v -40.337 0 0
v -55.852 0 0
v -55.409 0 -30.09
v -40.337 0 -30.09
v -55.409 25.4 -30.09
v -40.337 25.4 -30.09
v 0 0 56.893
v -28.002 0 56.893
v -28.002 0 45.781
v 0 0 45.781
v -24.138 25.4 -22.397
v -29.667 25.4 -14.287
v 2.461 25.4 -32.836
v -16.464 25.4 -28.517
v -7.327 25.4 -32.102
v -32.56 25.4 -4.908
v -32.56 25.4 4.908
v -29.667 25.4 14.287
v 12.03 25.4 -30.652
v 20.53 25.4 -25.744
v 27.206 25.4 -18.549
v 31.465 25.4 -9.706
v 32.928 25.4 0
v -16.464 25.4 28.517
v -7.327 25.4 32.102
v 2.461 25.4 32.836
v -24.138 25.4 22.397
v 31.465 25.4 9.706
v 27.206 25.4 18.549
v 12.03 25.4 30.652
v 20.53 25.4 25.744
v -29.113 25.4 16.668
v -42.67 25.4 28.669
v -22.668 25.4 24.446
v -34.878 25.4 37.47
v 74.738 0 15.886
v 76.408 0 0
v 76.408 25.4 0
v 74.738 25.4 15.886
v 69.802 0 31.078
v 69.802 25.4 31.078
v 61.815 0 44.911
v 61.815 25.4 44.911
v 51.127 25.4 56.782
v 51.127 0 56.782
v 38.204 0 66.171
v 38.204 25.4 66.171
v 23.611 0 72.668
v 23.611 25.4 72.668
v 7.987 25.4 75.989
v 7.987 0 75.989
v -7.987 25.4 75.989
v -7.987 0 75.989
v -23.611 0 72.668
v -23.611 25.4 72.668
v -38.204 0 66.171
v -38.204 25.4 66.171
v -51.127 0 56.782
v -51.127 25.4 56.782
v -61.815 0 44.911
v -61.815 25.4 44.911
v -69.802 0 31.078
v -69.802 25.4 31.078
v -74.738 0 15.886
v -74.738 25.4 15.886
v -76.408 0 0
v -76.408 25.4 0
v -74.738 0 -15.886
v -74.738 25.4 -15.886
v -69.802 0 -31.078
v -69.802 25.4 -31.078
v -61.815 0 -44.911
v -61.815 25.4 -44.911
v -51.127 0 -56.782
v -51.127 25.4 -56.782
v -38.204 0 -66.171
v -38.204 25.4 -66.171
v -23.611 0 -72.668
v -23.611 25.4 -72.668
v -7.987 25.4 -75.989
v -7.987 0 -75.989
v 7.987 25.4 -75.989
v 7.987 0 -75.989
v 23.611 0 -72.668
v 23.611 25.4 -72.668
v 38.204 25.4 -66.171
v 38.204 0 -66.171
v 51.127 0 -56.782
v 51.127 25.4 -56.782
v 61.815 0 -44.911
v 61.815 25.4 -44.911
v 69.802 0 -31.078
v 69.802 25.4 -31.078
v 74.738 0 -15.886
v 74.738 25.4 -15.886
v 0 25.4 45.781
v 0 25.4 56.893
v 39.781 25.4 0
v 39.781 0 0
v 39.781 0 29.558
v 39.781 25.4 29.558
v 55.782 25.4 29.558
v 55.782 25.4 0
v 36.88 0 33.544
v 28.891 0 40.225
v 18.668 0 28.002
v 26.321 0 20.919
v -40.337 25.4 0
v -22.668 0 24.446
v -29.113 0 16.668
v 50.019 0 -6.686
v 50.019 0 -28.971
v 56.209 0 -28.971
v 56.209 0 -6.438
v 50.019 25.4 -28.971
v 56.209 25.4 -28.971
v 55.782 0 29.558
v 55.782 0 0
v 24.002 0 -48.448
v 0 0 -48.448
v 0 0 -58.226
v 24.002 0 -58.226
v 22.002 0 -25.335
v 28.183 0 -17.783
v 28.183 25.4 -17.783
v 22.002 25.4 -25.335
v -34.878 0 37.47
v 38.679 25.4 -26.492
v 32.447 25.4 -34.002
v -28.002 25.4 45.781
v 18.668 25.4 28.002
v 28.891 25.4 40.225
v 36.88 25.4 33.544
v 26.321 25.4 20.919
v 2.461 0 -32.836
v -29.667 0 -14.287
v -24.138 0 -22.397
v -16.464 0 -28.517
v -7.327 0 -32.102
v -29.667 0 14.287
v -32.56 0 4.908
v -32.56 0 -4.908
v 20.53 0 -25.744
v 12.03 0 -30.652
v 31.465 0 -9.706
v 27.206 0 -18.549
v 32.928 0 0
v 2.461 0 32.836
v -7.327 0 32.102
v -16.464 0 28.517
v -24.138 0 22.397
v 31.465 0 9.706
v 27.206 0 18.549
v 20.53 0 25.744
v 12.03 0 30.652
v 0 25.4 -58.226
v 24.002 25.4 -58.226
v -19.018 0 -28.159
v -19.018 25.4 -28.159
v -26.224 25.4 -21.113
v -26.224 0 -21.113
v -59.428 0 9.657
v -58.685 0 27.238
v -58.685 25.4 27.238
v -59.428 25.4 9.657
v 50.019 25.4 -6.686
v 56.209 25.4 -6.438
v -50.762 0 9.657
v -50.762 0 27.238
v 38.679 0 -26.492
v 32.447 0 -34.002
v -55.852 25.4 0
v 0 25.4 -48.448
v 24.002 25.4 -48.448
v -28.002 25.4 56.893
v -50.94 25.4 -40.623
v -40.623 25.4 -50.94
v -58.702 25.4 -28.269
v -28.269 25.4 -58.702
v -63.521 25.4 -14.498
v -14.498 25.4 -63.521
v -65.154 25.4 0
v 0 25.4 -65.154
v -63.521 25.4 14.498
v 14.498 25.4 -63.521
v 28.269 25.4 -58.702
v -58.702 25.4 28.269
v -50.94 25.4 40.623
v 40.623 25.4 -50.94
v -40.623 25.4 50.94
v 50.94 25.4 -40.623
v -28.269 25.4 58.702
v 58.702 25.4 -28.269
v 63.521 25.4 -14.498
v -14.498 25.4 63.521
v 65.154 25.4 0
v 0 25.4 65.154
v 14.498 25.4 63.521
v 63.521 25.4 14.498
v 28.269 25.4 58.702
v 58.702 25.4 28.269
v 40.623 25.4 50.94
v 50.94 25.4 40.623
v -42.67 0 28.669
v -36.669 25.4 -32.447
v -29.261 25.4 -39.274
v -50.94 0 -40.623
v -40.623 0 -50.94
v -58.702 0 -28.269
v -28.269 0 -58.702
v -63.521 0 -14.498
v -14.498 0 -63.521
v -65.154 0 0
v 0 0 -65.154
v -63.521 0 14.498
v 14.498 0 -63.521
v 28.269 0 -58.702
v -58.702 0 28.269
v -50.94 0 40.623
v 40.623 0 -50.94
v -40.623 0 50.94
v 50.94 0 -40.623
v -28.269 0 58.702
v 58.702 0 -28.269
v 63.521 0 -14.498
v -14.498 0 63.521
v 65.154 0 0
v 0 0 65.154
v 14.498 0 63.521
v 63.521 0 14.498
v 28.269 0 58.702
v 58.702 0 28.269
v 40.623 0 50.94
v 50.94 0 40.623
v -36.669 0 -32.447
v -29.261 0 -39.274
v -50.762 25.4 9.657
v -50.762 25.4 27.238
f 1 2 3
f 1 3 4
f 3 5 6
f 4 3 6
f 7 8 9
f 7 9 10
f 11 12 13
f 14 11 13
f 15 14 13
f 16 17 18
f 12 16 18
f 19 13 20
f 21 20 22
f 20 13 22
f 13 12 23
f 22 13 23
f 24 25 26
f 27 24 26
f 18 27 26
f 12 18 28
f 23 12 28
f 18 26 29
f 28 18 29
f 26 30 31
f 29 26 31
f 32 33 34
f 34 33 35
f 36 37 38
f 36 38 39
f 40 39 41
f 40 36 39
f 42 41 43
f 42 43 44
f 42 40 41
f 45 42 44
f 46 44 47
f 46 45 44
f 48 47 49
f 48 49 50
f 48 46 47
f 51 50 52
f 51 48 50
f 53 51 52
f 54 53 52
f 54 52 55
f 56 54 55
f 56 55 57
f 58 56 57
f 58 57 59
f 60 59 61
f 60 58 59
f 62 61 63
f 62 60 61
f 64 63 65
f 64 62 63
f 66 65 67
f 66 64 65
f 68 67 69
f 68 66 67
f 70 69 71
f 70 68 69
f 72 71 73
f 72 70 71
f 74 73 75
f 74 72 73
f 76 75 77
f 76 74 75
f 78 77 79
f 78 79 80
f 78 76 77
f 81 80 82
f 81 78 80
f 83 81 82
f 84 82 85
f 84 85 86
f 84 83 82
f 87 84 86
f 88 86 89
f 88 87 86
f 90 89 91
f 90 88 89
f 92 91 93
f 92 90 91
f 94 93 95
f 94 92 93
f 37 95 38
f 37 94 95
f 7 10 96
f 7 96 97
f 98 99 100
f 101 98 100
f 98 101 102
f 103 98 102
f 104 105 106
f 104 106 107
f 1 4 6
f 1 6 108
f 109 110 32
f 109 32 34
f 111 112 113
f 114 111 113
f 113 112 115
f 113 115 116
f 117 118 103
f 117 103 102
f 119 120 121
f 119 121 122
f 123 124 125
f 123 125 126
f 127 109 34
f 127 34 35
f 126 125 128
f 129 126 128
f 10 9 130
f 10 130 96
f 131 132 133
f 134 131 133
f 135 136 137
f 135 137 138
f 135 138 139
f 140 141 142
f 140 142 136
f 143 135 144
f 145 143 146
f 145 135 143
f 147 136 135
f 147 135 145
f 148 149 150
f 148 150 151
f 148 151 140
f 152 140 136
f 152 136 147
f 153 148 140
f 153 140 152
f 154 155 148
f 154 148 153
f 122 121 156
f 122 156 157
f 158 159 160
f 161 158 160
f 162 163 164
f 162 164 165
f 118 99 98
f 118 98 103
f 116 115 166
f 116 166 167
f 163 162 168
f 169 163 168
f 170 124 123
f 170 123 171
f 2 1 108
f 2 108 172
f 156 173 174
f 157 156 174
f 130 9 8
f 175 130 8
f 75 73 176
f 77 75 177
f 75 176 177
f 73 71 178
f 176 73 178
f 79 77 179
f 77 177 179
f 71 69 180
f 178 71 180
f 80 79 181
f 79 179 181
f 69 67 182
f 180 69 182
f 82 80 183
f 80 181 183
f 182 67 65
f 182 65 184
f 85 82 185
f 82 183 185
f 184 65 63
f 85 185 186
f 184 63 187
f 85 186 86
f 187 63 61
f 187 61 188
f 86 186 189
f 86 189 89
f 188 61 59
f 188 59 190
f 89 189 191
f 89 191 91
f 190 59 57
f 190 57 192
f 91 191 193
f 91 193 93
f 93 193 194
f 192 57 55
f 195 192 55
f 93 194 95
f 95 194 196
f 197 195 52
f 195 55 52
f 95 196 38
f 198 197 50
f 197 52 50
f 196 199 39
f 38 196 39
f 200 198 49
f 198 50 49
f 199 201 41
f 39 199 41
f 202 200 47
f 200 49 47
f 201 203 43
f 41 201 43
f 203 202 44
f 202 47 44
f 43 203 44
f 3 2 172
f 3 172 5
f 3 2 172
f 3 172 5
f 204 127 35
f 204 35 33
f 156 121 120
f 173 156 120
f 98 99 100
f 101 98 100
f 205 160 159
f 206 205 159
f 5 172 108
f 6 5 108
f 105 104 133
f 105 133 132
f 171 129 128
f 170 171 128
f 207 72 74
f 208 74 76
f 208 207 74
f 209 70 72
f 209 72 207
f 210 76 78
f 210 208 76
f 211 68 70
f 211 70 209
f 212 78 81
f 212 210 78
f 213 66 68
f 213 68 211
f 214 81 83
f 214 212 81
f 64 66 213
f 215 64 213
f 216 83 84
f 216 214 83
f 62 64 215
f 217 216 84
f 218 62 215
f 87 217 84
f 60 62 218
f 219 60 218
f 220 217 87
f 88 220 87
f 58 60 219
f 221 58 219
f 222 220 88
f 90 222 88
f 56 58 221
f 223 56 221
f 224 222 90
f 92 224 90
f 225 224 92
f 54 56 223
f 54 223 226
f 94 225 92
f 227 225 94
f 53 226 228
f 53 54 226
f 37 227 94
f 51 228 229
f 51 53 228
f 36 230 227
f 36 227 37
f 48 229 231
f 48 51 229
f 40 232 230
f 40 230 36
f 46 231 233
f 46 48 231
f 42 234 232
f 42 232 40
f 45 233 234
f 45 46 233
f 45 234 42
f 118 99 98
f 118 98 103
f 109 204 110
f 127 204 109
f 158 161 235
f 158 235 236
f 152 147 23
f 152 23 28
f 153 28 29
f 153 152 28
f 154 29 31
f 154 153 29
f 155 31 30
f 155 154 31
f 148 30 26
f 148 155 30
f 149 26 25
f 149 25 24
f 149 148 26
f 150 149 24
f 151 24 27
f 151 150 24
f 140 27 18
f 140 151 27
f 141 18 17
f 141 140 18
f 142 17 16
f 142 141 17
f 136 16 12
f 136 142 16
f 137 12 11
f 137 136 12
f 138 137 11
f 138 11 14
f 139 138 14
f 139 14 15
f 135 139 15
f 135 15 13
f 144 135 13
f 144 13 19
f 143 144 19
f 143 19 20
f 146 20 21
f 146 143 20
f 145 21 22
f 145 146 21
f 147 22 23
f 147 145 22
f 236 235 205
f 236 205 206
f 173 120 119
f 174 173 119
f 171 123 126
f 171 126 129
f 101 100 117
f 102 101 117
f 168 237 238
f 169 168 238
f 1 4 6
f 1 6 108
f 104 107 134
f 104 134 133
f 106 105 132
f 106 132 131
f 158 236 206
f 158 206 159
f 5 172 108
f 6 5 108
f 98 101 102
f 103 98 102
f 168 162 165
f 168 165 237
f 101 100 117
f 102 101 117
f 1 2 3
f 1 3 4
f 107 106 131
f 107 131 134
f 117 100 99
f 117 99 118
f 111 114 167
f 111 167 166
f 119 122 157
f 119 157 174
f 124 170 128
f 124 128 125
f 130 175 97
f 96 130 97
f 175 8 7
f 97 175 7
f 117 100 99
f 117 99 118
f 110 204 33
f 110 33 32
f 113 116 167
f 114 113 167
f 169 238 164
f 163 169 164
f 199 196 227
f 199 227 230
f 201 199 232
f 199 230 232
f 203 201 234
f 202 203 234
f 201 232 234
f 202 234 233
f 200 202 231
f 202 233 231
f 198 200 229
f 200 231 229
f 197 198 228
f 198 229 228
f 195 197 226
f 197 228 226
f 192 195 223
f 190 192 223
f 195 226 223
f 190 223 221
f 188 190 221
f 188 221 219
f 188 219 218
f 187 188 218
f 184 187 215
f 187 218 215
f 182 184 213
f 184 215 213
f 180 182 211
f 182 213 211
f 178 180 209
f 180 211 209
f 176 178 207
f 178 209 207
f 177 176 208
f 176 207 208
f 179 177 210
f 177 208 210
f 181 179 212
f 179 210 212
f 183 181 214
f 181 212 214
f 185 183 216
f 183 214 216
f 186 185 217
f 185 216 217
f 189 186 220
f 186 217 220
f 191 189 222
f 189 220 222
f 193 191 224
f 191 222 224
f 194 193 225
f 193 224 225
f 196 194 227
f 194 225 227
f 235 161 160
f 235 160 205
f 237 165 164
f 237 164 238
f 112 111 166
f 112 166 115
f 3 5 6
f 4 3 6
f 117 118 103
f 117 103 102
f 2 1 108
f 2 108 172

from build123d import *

# Parameters (mm, degrees)
F0_R      = 76.407624
F0_R_2    = 65.154471
F1_DEPTH  = 25.4
F2_R      = 32.928031
F3_DEPTH  = 25.4
F4_W      = 16.001161
F4_H      = 29.557686
F5_DEPTH  = 25.4
F6_DEPTH  = 25.4
F7_W      = 28.00202
F7_H      = 11.111911
F8_DEPTH  = 25.4
F9_W      = 24.001732
F9_H      = 9.778481
F10_DEPTH = 25.4
F12_DEPTH = 25.4
F14_DEPTH = 25.4
F16_DEPTH = 25.4
F18_DEPTH = 25.4
F20_DEPTH = 25.4
F22_DEPTH = 25.4


with BuildPart() as f1:
    # F0 (on Front) → F1 (new body)
    with BuildSketch(Plane.XZ):
        Circle(F0_R)
        Circle(F0_R_2, mode=Mode.SUBTRACT)
    extrude(amount=-F1_DEPTH)


with BuildPart() as f3:
    # F2 (on Front) → F3 (new body)
    with BuildSketch(Plane.XZ):
        Circle(F2_R)
    extrude(amount=-F3_DEPTH)


with BuildPart() as f5:
    # F4 (on Front) → F5 (new body)
    with BuildSketch(Plane.XZ):
        Polygon((-40.337451, 0), (-55.851858, 0), (-55.408586, -30.090079), (-40.337451, -30.090079), align=None)
        with Locations((47.781223, 14.778843)):
            Rectangle(F4_W, F4_H)
    extrude(amount=-F5_DEPTH)


with BuildPart() as f6:
    # F4 (on Front) → F6 (new body)
    with BuildSketch(Plane.XZ):
        Polygon((-40.337451, 0), (-55.851858, 0), (-55.408586, -30.090079), (-40.337451, -30.090079), align=None)
        with Locations((47.781223, 14.778843)):
            Rectangle(F4_W, F4_H)
    extrude(amount=-F6_DEPTH)


with BuildPart() as f8:
    # F7 (on Front) → F8 (new body)
    with BuildSketch(Plane.XZ):
        with Locations((-14.00101, 51.337035)):
            Rectangle(F7_W, F7_H)
    extrude(amount=-F8_DEPTH)


with BuildPart() as f10:
    # F9 (on Front) → F10 (new body)
    with BuildSketch(Plane.XZ):
        with Locations((12.000866, -53.33718)):
            Rectangle(F9_W, F9_H)
    extrude(amount=-F10_DEPTH)


with BuildPart() as f12:
    # F11 (on Front) → F12 (new body)
    with BuildSketch(Plane.XZ):
        Polygon((-42.669743, 28.668735), (-29.113211, 16.667869), (-22.668302, 24.446206), (-34.878311, 37.470166), align=None)
    extrude(amount=-F12_DEPTH)


with BuildPart() as f14:
    # F13 (on Front) → F14 (new body)
    with BuildSketch(Plane.XZ):
        Polygon((28.890973, 40.225122), (18.668015, 28.002018), (26.320599, 20.918797), (36.879617, 33.543711), align=None)
    extrude(amount=-F14_DEPTH)


with BuildPart() as f16:
    # F15 (on Front) → F16 (new body)
    with BuildSketch(Plane.XZ):
        Polygon((28.183266, -17.782873), (22.001585, -25.335159), (32.446783, -34.002449), (38.678867, -26.491987), align=None)
    extrude(amount=-F16_DEPTH)


with BuildPart() as f18:
    # F17 (on Front) → F18 (new body)
    with BuildSketch(Plane.XZ):
        Polygon((-19.017636, -28.159155), (-26.224114, -21.112634), (-36.66931, -32.446787), (-29.260877, -39.274164), align=None)
    extrude(amount=-F18_DEPTH)


with BuildPart() as f20:
    # F19 (on Front) → F20 (new body)
    with BuildSketch(Plane.XZ):
        Polygon((-58.685303, 27.237905), (-59.428155, 9.657076), (-50.761547, 9.657076), (-50.761547, 27.237905), align=None)
    extrude(amount=-F20_DEPTH)


with BuildPart() as f22:
    # F21 (on Front) → F22 (new body)
    with BuildSketch(Plane.XZ):
        Polygon((56.209128, -6.43805), (50.018694, -6.685668), (50.018694, -28.971225), (56.209128, -28.971225), align=None)
    extrude(amount=-F22_DEPTH)


solid = Compound([f1.part, f3.part, f5.part, f6.part, f8.part, f10.part, f12.part, f14.part, f16.part, f18.part, f20.part, f22.part])
